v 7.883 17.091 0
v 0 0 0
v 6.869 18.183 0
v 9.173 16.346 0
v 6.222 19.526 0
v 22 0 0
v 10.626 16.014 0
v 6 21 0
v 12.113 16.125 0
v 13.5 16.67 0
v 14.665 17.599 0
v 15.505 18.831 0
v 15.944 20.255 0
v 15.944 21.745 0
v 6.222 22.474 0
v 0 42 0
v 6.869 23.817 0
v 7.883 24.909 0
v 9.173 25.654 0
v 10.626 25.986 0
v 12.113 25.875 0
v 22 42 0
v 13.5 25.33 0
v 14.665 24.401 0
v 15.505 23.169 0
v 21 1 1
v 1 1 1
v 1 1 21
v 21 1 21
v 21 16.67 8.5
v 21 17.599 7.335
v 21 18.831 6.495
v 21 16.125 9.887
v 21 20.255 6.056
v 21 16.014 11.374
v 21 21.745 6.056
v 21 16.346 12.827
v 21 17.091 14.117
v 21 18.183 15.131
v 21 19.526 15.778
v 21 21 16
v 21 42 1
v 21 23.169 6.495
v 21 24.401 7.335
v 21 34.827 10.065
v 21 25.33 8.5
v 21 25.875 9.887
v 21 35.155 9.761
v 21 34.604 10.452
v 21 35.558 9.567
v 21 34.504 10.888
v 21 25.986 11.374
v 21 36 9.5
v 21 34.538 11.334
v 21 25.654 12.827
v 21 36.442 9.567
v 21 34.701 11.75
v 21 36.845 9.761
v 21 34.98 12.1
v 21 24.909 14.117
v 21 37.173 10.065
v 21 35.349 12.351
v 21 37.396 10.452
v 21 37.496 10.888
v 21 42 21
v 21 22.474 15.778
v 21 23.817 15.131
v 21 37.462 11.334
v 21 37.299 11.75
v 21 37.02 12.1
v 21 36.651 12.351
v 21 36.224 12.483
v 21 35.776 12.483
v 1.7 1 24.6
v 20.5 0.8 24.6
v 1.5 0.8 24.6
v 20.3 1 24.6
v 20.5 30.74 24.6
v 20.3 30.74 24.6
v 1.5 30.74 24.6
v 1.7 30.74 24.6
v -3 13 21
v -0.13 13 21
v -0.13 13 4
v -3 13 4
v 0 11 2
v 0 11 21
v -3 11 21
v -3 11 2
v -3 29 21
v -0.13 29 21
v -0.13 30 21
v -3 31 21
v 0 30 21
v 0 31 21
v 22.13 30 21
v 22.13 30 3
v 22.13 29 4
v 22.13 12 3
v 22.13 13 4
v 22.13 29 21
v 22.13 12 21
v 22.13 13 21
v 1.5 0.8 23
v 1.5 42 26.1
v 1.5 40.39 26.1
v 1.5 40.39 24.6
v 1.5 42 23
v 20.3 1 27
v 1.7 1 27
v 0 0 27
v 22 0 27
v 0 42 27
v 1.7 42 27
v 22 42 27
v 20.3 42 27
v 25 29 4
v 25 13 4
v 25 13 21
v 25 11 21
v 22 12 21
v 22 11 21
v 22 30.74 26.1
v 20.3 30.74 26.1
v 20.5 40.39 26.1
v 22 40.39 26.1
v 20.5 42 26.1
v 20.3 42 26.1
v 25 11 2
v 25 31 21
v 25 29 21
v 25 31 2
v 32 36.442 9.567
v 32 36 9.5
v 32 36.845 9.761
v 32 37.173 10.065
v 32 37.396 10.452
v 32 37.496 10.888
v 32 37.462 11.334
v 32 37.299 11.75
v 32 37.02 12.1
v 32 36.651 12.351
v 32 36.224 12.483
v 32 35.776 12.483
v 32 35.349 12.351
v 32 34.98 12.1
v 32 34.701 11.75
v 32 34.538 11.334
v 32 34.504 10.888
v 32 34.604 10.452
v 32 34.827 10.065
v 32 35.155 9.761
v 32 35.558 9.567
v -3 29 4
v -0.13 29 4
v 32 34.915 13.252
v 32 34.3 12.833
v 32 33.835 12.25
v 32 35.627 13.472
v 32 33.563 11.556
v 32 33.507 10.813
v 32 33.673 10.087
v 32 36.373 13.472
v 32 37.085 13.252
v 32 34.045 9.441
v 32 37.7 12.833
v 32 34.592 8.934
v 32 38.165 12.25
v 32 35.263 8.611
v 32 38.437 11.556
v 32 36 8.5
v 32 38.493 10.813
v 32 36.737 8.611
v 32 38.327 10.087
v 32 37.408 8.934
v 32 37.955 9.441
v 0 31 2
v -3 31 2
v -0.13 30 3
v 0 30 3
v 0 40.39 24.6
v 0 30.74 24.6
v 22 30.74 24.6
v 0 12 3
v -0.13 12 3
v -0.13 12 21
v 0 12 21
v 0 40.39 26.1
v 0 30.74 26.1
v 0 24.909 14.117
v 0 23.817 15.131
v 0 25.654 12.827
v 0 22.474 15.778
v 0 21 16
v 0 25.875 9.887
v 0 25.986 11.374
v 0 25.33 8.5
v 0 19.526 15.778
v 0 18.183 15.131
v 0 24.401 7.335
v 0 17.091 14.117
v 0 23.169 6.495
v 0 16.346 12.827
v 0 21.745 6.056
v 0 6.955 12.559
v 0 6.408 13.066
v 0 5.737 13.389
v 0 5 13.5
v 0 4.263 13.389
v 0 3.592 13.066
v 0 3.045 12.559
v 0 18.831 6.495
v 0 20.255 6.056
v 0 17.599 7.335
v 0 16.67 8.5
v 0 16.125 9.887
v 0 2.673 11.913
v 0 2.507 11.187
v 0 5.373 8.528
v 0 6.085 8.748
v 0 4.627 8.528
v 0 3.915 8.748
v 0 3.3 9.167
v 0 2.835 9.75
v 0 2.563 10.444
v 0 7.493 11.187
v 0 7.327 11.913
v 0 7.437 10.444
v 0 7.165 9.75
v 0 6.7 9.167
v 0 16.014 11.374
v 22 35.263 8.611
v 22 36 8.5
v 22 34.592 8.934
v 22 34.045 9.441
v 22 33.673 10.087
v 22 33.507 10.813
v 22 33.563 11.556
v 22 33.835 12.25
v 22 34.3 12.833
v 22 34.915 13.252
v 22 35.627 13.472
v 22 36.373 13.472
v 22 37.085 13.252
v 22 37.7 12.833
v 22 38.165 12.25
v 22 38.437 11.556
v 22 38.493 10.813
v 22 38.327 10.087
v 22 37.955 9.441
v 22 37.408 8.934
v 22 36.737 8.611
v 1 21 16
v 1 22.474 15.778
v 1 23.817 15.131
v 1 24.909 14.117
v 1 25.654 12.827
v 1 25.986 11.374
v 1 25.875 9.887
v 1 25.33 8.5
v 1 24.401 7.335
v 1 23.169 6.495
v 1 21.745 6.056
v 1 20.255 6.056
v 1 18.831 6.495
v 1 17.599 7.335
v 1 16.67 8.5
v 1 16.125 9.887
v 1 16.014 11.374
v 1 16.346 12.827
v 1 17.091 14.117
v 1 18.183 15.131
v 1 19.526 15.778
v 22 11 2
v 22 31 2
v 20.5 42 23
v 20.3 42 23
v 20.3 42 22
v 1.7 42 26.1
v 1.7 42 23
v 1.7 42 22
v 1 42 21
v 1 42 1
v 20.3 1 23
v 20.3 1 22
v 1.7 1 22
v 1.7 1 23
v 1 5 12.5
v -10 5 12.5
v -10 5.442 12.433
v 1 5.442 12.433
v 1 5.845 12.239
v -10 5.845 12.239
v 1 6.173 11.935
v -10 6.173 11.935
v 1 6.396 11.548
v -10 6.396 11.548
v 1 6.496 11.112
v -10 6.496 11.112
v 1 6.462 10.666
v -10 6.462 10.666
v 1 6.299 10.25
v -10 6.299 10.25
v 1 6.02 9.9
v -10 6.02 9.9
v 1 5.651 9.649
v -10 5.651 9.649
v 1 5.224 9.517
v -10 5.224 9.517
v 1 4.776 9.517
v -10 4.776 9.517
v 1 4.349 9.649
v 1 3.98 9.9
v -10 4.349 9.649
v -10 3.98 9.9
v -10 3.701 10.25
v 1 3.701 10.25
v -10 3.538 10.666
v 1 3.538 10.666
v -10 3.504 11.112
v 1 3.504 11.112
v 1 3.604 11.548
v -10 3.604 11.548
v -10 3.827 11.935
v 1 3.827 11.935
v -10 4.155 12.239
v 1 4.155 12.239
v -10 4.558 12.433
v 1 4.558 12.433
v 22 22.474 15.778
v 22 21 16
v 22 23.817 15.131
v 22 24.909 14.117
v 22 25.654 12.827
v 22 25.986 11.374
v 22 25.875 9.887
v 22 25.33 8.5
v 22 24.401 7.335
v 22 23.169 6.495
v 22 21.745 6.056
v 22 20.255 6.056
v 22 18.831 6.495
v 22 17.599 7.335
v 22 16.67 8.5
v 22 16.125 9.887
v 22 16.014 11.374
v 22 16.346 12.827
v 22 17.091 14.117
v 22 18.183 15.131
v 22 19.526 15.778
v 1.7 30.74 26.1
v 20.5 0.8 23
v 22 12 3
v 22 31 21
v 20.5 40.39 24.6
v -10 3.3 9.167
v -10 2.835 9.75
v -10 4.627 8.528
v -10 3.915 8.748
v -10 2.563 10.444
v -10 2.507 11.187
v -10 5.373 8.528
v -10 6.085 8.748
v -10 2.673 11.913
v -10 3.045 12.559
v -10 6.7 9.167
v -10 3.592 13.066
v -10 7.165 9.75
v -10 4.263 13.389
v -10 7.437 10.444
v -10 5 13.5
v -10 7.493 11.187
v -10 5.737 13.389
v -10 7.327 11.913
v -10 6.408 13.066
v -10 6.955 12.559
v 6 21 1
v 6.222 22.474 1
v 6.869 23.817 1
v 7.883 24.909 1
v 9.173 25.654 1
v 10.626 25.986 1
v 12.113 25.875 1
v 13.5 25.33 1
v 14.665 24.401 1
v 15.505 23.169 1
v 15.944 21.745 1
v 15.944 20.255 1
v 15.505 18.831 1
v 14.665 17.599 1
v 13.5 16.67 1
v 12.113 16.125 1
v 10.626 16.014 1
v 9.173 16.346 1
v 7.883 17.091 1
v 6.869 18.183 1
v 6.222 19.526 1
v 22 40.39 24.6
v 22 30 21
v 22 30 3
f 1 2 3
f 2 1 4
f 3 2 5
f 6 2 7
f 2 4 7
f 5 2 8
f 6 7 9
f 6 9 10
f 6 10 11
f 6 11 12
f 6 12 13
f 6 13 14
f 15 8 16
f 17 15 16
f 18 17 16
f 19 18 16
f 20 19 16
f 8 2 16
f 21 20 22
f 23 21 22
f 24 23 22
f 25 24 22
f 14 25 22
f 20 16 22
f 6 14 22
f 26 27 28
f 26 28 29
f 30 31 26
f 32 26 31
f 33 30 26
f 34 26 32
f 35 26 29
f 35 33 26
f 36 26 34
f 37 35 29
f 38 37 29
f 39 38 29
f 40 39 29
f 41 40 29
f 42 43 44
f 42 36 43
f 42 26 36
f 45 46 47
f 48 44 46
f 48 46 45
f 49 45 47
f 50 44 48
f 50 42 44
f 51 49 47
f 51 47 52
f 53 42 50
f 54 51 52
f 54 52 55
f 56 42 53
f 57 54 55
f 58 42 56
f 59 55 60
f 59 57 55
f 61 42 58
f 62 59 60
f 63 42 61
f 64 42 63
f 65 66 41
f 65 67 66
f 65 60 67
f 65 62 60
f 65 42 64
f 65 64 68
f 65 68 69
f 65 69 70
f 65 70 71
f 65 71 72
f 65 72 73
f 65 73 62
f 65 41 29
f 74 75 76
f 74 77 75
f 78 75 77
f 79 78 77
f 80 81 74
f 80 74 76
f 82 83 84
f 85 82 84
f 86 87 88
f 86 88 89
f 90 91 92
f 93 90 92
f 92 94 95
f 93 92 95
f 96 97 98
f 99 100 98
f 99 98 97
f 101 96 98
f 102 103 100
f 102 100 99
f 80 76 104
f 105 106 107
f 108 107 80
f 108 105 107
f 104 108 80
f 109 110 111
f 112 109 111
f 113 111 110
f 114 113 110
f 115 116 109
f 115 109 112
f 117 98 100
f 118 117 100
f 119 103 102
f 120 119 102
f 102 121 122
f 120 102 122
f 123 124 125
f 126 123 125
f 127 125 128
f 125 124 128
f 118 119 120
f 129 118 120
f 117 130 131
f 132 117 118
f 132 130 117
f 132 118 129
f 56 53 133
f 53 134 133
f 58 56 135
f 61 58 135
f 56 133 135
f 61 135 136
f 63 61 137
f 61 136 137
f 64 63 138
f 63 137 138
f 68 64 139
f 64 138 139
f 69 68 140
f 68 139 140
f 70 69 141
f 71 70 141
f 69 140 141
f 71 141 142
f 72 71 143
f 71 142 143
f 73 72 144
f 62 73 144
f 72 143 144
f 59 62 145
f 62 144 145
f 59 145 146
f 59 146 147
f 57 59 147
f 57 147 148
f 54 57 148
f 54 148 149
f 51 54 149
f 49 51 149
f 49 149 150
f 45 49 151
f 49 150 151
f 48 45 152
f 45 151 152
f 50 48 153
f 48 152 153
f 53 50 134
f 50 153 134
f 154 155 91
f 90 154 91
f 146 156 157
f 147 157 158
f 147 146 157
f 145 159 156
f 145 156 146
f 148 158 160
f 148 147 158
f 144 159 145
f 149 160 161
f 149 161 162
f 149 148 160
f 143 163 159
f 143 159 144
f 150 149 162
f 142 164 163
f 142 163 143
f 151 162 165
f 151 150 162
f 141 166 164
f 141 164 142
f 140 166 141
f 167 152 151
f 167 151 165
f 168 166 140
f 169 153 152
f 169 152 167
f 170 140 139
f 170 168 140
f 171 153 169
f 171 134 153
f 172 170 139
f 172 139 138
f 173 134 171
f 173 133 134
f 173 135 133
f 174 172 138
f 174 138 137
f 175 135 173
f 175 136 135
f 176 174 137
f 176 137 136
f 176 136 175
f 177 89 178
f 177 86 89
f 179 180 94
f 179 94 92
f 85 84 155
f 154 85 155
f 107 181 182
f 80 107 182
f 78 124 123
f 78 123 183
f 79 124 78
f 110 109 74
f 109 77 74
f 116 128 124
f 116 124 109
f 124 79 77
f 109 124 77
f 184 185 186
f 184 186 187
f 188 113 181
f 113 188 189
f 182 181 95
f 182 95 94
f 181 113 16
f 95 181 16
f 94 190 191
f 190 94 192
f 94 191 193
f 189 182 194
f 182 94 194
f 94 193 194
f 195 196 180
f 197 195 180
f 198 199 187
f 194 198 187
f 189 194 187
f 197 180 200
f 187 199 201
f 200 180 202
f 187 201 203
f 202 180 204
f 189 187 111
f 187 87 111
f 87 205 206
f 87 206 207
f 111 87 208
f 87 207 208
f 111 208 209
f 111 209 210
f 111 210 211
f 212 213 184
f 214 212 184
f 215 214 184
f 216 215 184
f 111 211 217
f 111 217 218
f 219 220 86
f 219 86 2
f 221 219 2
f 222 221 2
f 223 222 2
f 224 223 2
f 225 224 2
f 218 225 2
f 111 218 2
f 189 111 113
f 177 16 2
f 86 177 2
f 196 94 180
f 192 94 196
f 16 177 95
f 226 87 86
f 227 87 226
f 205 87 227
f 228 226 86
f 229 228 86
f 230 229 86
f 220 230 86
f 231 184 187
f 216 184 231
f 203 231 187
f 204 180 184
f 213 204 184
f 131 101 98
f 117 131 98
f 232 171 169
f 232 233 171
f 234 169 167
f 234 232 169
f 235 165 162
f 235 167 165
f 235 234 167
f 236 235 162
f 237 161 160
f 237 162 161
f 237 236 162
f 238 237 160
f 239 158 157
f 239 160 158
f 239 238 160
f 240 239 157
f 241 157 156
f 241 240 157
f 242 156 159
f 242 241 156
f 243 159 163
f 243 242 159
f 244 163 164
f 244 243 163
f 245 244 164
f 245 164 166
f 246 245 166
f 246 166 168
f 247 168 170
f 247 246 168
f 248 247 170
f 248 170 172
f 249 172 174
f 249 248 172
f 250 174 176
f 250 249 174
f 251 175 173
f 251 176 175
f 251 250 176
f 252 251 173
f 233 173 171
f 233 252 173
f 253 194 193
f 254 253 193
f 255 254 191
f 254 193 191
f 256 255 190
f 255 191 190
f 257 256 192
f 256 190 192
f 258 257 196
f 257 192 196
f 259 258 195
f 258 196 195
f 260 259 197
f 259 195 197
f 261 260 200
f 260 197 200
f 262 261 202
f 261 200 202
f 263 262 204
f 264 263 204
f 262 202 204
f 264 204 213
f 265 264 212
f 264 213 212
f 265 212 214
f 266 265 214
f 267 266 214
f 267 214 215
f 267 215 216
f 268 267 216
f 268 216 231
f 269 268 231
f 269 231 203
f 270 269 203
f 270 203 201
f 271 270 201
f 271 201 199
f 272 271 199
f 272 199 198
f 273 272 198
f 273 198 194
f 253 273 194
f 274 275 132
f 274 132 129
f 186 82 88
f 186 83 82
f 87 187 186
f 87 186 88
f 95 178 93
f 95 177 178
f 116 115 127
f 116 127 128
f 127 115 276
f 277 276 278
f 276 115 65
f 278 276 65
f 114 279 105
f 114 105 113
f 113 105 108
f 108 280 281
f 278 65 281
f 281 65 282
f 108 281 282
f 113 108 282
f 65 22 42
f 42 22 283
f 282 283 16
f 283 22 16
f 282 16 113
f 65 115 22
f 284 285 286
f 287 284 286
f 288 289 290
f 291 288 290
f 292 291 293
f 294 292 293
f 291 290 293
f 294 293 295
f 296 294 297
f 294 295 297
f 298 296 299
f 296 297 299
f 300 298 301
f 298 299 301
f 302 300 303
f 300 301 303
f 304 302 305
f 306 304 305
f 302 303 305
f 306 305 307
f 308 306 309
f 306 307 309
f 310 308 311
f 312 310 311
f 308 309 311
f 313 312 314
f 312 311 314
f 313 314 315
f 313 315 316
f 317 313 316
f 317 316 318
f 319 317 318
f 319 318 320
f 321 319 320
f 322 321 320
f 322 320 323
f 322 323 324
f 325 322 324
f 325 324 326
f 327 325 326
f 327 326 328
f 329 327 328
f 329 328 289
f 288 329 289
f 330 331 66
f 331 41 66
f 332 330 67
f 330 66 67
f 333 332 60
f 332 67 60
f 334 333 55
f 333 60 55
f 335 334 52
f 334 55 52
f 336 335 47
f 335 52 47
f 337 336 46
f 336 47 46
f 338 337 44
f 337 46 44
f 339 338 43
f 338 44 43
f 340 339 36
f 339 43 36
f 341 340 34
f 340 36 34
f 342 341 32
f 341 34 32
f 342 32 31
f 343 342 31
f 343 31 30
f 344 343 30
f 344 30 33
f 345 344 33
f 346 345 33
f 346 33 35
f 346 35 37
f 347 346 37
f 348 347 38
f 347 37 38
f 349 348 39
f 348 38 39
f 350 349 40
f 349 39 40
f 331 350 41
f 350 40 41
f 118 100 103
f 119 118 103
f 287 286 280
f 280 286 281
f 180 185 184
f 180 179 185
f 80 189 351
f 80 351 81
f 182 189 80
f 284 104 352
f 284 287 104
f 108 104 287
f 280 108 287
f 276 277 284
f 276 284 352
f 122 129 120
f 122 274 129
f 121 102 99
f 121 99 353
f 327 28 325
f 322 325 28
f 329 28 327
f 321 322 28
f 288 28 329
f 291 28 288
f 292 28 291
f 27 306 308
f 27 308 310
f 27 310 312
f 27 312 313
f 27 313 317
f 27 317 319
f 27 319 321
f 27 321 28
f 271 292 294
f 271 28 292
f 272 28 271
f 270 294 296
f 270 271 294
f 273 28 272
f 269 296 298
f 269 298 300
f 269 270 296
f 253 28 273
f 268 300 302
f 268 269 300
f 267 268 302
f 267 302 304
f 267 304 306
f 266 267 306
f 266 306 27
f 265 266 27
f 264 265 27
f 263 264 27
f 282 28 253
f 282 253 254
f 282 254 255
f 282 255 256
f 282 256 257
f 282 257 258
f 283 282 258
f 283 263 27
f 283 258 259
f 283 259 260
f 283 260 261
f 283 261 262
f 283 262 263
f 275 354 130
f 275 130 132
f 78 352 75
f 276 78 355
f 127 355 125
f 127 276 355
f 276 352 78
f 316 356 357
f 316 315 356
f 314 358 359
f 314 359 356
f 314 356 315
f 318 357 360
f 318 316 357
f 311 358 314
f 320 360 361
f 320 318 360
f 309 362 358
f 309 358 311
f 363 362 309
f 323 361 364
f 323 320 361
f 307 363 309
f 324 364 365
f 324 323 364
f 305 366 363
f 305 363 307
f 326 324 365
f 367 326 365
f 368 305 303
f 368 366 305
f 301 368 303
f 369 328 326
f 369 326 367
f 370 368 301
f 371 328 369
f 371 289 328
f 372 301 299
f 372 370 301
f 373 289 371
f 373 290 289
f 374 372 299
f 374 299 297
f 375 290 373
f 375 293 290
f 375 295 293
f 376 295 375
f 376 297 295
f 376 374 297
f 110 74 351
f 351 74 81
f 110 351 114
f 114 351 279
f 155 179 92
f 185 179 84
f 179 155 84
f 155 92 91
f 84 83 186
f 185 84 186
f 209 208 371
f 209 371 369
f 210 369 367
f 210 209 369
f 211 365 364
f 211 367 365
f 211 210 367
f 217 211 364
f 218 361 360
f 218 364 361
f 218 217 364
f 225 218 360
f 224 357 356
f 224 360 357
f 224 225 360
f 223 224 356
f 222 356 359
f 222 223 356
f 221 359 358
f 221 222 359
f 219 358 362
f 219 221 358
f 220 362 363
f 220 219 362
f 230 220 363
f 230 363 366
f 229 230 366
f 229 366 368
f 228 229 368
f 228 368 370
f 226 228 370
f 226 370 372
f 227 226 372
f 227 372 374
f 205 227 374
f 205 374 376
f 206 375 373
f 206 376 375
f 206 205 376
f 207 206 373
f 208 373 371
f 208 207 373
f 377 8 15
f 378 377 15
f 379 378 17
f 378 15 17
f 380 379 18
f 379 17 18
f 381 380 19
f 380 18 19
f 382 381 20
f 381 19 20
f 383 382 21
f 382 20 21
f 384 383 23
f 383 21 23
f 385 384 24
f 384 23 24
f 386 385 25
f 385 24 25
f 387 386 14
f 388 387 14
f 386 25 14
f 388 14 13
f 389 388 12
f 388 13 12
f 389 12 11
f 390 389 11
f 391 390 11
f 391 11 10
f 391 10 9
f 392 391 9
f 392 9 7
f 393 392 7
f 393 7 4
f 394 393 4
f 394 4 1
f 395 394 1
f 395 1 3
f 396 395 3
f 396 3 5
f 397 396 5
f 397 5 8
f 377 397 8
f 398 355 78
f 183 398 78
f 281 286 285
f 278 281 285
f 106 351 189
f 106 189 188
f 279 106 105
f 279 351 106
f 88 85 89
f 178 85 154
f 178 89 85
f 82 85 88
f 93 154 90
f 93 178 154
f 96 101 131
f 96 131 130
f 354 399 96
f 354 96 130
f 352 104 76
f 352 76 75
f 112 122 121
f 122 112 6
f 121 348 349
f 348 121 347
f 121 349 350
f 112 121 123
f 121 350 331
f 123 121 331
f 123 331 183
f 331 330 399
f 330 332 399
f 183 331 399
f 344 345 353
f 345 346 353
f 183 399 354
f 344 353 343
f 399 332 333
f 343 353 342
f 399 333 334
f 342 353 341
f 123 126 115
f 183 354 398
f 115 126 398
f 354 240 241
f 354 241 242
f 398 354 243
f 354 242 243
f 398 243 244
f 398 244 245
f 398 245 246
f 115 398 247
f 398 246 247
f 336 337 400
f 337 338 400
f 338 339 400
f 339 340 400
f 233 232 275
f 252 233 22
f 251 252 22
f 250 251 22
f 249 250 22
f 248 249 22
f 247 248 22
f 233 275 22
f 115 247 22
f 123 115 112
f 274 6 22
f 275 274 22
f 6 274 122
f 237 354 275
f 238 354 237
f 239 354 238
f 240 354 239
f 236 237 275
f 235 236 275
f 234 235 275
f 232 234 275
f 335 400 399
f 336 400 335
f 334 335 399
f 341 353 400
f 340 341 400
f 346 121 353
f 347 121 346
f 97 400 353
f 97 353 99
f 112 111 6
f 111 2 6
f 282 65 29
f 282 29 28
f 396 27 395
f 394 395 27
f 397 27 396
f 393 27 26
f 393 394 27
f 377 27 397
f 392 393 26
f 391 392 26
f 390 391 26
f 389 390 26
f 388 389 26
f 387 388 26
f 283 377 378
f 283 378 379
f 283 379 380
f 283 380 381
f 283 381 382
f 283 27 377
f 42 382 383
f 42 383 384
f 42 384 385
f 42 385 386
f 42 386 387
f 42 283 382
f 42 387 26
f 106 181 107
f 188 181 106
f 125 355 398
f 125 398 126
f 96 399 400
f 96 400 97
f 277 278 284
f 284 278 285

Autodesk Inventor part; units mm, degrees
ref_plane "YZ Plane" through (0, 0, 0) normal (1, 0, 0) x (0, 1, 0)
ref_plane "XZ Plane" through (0, 0, 0) normal (0, 1, 0) x (-1, 0, 0)
ref_plane "XY Plane" through (0, 0, 0) normal (0, 0, 1) x (1, 0, 0)
sketch "Sketch1" plane through (0, 0, 0) normal (0, 0, 1) x (1, 0, 0)
  line L0 (0, 0) -> (22, 0)
  line L1 (22, 0) -> (22, 42)
  line L2 (22, 42) -> (0, 42)
  line L3 (0, 42) -> (0, 0)
  dimension "d0" = 42
  dimension "d1" = 22
extrude "Extrusion1" add sketch "Sketch1" along normal blind 22
sketch "Sketch2" plane through (0, 0, 0) normal (-1, 0, 0) x (0, 0, 1)
  circle A0 centre (11, 5) radius 2.5
  line L0 (0, 42) -> (0, 0) projected
  line L1 (0, 0) -> (22, 0) projected
  dimension "d4" = 11
  dimension "d5" = 5
  dimension "d6" = 5
extrude "Extrusion2" add sketch "Sketch2" along normal blind 10
sketch "Sketch3" plane through (22, 0, 0) normal (1, 0, 0) x (0, 0, -1)
  circle A0 centre (-11, 36) radius 2.5
  line L0 (0, 42) -> (-22, 42) projected
  line L1 (0, 0) -> (0, 42) projected
  dimension "d9" = 5
  dimension "d10" = 6
  dimension "d11" = 11
extrude "Extrusion3" add sketch "Sketch3" along normal blind 10
sketch "Sketch4" plane through (0, 42, 0) normal (0, 1, 0) x (1, 0, 0)
  line L0 (1, -1) -> (21, -1)
  line L1 (21, -1) -> (21, -21)
  line L2 (21, -21) -> (1, -21)
  line L3 (1, -21) -> (1, -1)
  line L4 (0, 0) -> (0, -22) projected
  line L5 (22, 0) -> (0, 0) projected
  line L6 (22, 0) -> (22, -22) projected
  line L7 (22, -22) -> (0, -22) projected
  dimension "d14" = 1
  dimension "d15" = 1
  dimension "d16" = 1
  dimension "d17" = 1
extrude "Extrusion4" cut sketch "Sketch4" against normal blind 41 contours L0 L1 L2 L3
sketch "Sketch5" plane through (0, 0, 0) normal (-1, 0, 0) x (0, 0, 1)
  circle A0 centre (11, 21) radius 5
  line L0 (0, 42) -> (0, 0) projected
  line L1 (0, 0) -> (22, 0) projected
  dimension "d20" = 11
  dimension "d21" = 10
  dimension "d22" = 21
extrude "Extrusion5" cut sketch "Sketch5" against normal through all
sketch "Sketch6" plane through (0, 0, 0) normal (0, 0, -1) x (-1, 0, 0)
  circle A0 centre (-11, 21) radius 5
  line L0 (0, 0) -> (-22, 0) projected
  line L1 (0, 42) -> (0, 0) projected
  dimension "d25" = 21
  dimension "d26" = 11
  dimension "d27" = 10
extrude "Extrusion6" cut sketch "Sketch6" against normal up to surface (1 mm away)
sketch "Sketch7" plane through (-10, 5, 11) normal (-1, 0, 0) x (0, 0, 1)
  circle A0 centre (0, 0) radius 1.5
  circle A1 centre (0, 0) radius 2.5 projected
  point P0 (-11, -5)
  dimension "d30" = 1
extrude "Extrusion7" cut sketch "Sketch7" against normal up to surface (11 mm away) contours A0
sketch "Sketch8" plane through (32, 36, 11) normal (1, 0, 0) x (0, 0, -1)
  circle A0 centre (0, 0) radius 1.5
  circle A1 centre (0, 0) radius 2.5 projected
  point P0 (11, -36)
  dimension "d33" = 1
extrude "Extrusion8" cut sketch "Sketch8" against normal up to surface (11 mm away) contours A0
sketch "Sketch9" plane through (0, 0, 22) normal (0, 0, 1) x (1, 0, 0)
  line L0 (20.3, 42) -> (20.3, 1)
  line L1 (20.3, 1) -> (1.7, 1)
  line L2 (1.7, 1) -> (1.7, 42)
  line L3 (0, 42) -> (0, 0) projected
  line L4 (0, 0) -> (22, 0) projected
  line L5 (22, 42) -> (0, 42) projected
  line L6 (22, 42) -> (0, 42) projected
  line L7 (1.7, 42) -> (0, 42)
  line L8 (0, 42) -> (0, 0) projected
  line L9 (0, 42) -> (0, 0)
  line L10 (0, 0) -> (22, 0)
  line L11 (22, 0) -> (22, 42) projected
  line L12 (22, 0) -> (22, 42)
  line L13 (22, 0) -> (22, 42) projected
  line L14 (20.3, 42) -> (22, 42)
  point P0 (1.7, 42)
  dimension "d37" = 1.7
  dimension "d38" = 1
extrude "Extrusion9" add sketch "Sketch9" along normal blind 5 contours L5 L11 L4 L3 L2 L1 L0
sketch "Sketch10" plane through (0, 42, 0) normal (0, 1, 0) x (1, 0, 0)
  line L0 (20.5, -24.6) -> (1.5, -24.6)
  line L1 (1.5, -24.6) -> (1.5, -23)
  line L2 (1.5, -23) -> (20.5, -23)
  line L3 (20.5, -23) -> (20.5, -24.6)
  line L4 (0, 0) -> (0, -27) projected
  line L5 (20.3, -22) -> (1.7, -22) projected
  dimension "d41" = 19
  dimension "d42" = 1.6
  dimension "d43" = 1.5
  dimension "d44" = 1
extrude "Extrusion10" cut sketch "Sketch10" against normal blind 41.2
sketch "Sketch12" plane through (1.7, 1, 27) normal (1, 0, 0) x (0, 0, -1)
  line L0 (2.4, 41) -> (2.4, -0.2) projected
  line L1 (2.4, 39.39) -> (0.9, 39.39)
  line L2 (0.9, 39.39) -> (0.9, 29.74)
  line L3 (0.9, 29.74) -> (2.4, 29.74)
  line L4 (2.4, 29.74) -> (2.4, 39.39)
  line L5 (2.4, -0.2) -> (4, -0.2) projected
  point P0 (27, -1)
  point P1 (2.4, 29.74)
  dimension "d48" = 1.5
  dimension "d49" = 9.65
  dimension "d50" = 29.94
extrude "Extrusion11" cut sketch "Sketch12" along normal through all both and the other way through all
sketch "Sketch13" plane through (20.3, 1, 27) normal (-1, 0, 0) x (0, 0, 1)
  line L0 (-2.4, 39.39) -> (-2.4, 29.74) projected
  line L1 (-2.4, 39.39) -> (-0.9, 39.39)
  line L2 (-0.9, 39.39) -> (-0.9, 41)
  line L3 (-0.9, 41) -> (-2.4, 41)
  line L4 (-2.4, 41) -> (-2.4, 39.39)
  line L5 (-0.9, 39.39) -> (-0.9, 29.74) projected
  line L6 (-2.4, 41) -> (0, 41) projected
  point P0 (-27, -1)
extrude "Extrusion12" cut sketch "Sketch13" against normal up to surface (0.2 mm away)
sketch "Sketch14" plane through (1.7, 1, 27) normal (1, 0, 0) x (0, 0, -1)
  line L0 (2.4, 39.39) -> (2.4, 41) projected
  line L1 (2.4, 39.39) -> (0.9, 39.39)
  line L2 (0.9, 39.39) -> (0.9, 41)
  line L3 (0.9, 41) -> (2.4, 41)
  line L4 (2.4, 41) -> (2.4, 39.39)
  line L5 (0.9, 29.74) -> (0.9, 39.39) projected
  line L6 (2.4, 41) -> (0, 41) projected
  point P0 (27, -1)
extrude "Extrusion13" cut sketch "Sketch14" against normal up to surface (0.2 mm away)
sketch "Sketch15" plane through (0, 0, 0) normal (-1, 0, 0) x (0, 0, 1)
  line L0 (0, 42) -> (0, 0) projected
  line L1 (4, 29) -> (21, 29)
  line L2 (21, 13) -> (4, 13)
  line L3 (4, 13) -> (4, 29)
  line L4 (2, 31) -> (21, 31)
  line L5 (21, 11) -> (2, 11)
  line L6 (2, 11) -> (2, 31)
  line L7 (21, 13) -> (21, 11)
  line L8 (21, 29) -> (21, 31)
  circle A0 centre (11, 21) radius 5 projected
  dimension "d70" = 17
  dimension "d71" = 16
  dimension "d72" = 2
  dimension "d73" = 2
  dimension "d74" = 8
  dimension "d75" = 7
extrude "Extrusion15" add sketch "Sketch15" along normal blind 3 contours L3 L2 L7 L5 L6 L4 L8 L1
sketch "Sketch16" plane through (0, 11, 21) normal (0, 0, 1) x (1, 0, 0)
  line L0 (0, 31) -> (0, -11) projected
  line L1 (-0.13, 1) -> (0, 1)
  line L2 (0, 1) -> (0, 19)
  line L3 (0, 19) -> (-0.13, 19)
  line L4 (-0.13, 19) -> (-0.13, 1)
  line L5 (0, 0) -> (-3, 0) projected
  point P0 (0, 1)
  dimension "d78" = 0.13
  dimension "d79" = 18
  dimension "d80" = 1
extrude "Extrusion16" cut sketch "Sketch16" against normal blind 18
sketch "Sketch17" plane through (22, 0, 0) normal (1, 0, 0) x (0, 0, -1)
  line L0 (-21, 31) -> (-2, 31)
  line L1 (-2, 31) -> (-2, 11)
  line L2 (-2, 11) -> (-21, 11)
  line L3 (-21, 29) -> (-4, 29)
  line L4 (-4, 29) -> (-4, 13)
  line L5 (-4, 13) -> (-21, 13)
  line L6 (-21, 29) -> (-21, 31)
  line L7 (-21, 13) -> (-21, 11)
  circle A0 centre (-11, 21) radius 5 projected
  point P0 (0, 0)
  point P1 (0, 67.5888)
  dimension "d89" = 2
  dimension "d90" = 16
  dimension "d91" = 17
  dimension "d92" = 2
  dimension "d93" = 8
  dimension "d94" = 7
extrude "Extrusion17" add sketch "Sketch17" along normal blind 3 contours L0 L1 L2 L7 L5 L4 L3 L6
sketch "Sketch19" plane through (22, 29, 21) normal (0, 0, 1) x (1, 0, 0)
  line L0 (0, 2) -> (0, -18) projected
  line L1 (0, 1) -> (0.13, 1)
  line L2 (0.13, 1) -> (0.13, -17)
  line L3 (0.13, -17) -> (0, -17)
  line L4 (0, -17) -> (0, 1)
  line L5 (0, 2) -> (3, 2) projected
  point P0 (-22, -29)
  point P1 (0, -17)
  dimension "d105" = 0.13
  dimension "d106" = 18
  dimension "d107" = 1
extrude "Extrusion19" cut sketch "Sketch19" against normal blind 18
sketch "Sketch18" plane through (0, 0, 0) normal (0, 0, -1) x (-1, 0, 0)
  line L0 (-1, 31) -> (-1, 12)
  line L1 (-1, 12) -> (-21, 12)
  line L2 (-21, 12) -> (-21, 31)
  line L3 (-3, 31) -> (-3, 14)
  line L4 (-3, 14) -> (-19, 14)
  line L5 (-19, 14) -> (-19, 31)
  line L6 (-21, 31) -> (-19, 31)
  line L7 (-3, 31) -> (-1, 31)
  circle A0 centre (-11, 21) radius 5 projected
  point P0 (0, 0)
  dimension "d97" = 16
  dimension "d98" = 2
  dimension "d99" = 17
  dimension "d100" = 2
  dimension "d101" = 8
  dimension "d102" = 7
properties part number "Measurement"
